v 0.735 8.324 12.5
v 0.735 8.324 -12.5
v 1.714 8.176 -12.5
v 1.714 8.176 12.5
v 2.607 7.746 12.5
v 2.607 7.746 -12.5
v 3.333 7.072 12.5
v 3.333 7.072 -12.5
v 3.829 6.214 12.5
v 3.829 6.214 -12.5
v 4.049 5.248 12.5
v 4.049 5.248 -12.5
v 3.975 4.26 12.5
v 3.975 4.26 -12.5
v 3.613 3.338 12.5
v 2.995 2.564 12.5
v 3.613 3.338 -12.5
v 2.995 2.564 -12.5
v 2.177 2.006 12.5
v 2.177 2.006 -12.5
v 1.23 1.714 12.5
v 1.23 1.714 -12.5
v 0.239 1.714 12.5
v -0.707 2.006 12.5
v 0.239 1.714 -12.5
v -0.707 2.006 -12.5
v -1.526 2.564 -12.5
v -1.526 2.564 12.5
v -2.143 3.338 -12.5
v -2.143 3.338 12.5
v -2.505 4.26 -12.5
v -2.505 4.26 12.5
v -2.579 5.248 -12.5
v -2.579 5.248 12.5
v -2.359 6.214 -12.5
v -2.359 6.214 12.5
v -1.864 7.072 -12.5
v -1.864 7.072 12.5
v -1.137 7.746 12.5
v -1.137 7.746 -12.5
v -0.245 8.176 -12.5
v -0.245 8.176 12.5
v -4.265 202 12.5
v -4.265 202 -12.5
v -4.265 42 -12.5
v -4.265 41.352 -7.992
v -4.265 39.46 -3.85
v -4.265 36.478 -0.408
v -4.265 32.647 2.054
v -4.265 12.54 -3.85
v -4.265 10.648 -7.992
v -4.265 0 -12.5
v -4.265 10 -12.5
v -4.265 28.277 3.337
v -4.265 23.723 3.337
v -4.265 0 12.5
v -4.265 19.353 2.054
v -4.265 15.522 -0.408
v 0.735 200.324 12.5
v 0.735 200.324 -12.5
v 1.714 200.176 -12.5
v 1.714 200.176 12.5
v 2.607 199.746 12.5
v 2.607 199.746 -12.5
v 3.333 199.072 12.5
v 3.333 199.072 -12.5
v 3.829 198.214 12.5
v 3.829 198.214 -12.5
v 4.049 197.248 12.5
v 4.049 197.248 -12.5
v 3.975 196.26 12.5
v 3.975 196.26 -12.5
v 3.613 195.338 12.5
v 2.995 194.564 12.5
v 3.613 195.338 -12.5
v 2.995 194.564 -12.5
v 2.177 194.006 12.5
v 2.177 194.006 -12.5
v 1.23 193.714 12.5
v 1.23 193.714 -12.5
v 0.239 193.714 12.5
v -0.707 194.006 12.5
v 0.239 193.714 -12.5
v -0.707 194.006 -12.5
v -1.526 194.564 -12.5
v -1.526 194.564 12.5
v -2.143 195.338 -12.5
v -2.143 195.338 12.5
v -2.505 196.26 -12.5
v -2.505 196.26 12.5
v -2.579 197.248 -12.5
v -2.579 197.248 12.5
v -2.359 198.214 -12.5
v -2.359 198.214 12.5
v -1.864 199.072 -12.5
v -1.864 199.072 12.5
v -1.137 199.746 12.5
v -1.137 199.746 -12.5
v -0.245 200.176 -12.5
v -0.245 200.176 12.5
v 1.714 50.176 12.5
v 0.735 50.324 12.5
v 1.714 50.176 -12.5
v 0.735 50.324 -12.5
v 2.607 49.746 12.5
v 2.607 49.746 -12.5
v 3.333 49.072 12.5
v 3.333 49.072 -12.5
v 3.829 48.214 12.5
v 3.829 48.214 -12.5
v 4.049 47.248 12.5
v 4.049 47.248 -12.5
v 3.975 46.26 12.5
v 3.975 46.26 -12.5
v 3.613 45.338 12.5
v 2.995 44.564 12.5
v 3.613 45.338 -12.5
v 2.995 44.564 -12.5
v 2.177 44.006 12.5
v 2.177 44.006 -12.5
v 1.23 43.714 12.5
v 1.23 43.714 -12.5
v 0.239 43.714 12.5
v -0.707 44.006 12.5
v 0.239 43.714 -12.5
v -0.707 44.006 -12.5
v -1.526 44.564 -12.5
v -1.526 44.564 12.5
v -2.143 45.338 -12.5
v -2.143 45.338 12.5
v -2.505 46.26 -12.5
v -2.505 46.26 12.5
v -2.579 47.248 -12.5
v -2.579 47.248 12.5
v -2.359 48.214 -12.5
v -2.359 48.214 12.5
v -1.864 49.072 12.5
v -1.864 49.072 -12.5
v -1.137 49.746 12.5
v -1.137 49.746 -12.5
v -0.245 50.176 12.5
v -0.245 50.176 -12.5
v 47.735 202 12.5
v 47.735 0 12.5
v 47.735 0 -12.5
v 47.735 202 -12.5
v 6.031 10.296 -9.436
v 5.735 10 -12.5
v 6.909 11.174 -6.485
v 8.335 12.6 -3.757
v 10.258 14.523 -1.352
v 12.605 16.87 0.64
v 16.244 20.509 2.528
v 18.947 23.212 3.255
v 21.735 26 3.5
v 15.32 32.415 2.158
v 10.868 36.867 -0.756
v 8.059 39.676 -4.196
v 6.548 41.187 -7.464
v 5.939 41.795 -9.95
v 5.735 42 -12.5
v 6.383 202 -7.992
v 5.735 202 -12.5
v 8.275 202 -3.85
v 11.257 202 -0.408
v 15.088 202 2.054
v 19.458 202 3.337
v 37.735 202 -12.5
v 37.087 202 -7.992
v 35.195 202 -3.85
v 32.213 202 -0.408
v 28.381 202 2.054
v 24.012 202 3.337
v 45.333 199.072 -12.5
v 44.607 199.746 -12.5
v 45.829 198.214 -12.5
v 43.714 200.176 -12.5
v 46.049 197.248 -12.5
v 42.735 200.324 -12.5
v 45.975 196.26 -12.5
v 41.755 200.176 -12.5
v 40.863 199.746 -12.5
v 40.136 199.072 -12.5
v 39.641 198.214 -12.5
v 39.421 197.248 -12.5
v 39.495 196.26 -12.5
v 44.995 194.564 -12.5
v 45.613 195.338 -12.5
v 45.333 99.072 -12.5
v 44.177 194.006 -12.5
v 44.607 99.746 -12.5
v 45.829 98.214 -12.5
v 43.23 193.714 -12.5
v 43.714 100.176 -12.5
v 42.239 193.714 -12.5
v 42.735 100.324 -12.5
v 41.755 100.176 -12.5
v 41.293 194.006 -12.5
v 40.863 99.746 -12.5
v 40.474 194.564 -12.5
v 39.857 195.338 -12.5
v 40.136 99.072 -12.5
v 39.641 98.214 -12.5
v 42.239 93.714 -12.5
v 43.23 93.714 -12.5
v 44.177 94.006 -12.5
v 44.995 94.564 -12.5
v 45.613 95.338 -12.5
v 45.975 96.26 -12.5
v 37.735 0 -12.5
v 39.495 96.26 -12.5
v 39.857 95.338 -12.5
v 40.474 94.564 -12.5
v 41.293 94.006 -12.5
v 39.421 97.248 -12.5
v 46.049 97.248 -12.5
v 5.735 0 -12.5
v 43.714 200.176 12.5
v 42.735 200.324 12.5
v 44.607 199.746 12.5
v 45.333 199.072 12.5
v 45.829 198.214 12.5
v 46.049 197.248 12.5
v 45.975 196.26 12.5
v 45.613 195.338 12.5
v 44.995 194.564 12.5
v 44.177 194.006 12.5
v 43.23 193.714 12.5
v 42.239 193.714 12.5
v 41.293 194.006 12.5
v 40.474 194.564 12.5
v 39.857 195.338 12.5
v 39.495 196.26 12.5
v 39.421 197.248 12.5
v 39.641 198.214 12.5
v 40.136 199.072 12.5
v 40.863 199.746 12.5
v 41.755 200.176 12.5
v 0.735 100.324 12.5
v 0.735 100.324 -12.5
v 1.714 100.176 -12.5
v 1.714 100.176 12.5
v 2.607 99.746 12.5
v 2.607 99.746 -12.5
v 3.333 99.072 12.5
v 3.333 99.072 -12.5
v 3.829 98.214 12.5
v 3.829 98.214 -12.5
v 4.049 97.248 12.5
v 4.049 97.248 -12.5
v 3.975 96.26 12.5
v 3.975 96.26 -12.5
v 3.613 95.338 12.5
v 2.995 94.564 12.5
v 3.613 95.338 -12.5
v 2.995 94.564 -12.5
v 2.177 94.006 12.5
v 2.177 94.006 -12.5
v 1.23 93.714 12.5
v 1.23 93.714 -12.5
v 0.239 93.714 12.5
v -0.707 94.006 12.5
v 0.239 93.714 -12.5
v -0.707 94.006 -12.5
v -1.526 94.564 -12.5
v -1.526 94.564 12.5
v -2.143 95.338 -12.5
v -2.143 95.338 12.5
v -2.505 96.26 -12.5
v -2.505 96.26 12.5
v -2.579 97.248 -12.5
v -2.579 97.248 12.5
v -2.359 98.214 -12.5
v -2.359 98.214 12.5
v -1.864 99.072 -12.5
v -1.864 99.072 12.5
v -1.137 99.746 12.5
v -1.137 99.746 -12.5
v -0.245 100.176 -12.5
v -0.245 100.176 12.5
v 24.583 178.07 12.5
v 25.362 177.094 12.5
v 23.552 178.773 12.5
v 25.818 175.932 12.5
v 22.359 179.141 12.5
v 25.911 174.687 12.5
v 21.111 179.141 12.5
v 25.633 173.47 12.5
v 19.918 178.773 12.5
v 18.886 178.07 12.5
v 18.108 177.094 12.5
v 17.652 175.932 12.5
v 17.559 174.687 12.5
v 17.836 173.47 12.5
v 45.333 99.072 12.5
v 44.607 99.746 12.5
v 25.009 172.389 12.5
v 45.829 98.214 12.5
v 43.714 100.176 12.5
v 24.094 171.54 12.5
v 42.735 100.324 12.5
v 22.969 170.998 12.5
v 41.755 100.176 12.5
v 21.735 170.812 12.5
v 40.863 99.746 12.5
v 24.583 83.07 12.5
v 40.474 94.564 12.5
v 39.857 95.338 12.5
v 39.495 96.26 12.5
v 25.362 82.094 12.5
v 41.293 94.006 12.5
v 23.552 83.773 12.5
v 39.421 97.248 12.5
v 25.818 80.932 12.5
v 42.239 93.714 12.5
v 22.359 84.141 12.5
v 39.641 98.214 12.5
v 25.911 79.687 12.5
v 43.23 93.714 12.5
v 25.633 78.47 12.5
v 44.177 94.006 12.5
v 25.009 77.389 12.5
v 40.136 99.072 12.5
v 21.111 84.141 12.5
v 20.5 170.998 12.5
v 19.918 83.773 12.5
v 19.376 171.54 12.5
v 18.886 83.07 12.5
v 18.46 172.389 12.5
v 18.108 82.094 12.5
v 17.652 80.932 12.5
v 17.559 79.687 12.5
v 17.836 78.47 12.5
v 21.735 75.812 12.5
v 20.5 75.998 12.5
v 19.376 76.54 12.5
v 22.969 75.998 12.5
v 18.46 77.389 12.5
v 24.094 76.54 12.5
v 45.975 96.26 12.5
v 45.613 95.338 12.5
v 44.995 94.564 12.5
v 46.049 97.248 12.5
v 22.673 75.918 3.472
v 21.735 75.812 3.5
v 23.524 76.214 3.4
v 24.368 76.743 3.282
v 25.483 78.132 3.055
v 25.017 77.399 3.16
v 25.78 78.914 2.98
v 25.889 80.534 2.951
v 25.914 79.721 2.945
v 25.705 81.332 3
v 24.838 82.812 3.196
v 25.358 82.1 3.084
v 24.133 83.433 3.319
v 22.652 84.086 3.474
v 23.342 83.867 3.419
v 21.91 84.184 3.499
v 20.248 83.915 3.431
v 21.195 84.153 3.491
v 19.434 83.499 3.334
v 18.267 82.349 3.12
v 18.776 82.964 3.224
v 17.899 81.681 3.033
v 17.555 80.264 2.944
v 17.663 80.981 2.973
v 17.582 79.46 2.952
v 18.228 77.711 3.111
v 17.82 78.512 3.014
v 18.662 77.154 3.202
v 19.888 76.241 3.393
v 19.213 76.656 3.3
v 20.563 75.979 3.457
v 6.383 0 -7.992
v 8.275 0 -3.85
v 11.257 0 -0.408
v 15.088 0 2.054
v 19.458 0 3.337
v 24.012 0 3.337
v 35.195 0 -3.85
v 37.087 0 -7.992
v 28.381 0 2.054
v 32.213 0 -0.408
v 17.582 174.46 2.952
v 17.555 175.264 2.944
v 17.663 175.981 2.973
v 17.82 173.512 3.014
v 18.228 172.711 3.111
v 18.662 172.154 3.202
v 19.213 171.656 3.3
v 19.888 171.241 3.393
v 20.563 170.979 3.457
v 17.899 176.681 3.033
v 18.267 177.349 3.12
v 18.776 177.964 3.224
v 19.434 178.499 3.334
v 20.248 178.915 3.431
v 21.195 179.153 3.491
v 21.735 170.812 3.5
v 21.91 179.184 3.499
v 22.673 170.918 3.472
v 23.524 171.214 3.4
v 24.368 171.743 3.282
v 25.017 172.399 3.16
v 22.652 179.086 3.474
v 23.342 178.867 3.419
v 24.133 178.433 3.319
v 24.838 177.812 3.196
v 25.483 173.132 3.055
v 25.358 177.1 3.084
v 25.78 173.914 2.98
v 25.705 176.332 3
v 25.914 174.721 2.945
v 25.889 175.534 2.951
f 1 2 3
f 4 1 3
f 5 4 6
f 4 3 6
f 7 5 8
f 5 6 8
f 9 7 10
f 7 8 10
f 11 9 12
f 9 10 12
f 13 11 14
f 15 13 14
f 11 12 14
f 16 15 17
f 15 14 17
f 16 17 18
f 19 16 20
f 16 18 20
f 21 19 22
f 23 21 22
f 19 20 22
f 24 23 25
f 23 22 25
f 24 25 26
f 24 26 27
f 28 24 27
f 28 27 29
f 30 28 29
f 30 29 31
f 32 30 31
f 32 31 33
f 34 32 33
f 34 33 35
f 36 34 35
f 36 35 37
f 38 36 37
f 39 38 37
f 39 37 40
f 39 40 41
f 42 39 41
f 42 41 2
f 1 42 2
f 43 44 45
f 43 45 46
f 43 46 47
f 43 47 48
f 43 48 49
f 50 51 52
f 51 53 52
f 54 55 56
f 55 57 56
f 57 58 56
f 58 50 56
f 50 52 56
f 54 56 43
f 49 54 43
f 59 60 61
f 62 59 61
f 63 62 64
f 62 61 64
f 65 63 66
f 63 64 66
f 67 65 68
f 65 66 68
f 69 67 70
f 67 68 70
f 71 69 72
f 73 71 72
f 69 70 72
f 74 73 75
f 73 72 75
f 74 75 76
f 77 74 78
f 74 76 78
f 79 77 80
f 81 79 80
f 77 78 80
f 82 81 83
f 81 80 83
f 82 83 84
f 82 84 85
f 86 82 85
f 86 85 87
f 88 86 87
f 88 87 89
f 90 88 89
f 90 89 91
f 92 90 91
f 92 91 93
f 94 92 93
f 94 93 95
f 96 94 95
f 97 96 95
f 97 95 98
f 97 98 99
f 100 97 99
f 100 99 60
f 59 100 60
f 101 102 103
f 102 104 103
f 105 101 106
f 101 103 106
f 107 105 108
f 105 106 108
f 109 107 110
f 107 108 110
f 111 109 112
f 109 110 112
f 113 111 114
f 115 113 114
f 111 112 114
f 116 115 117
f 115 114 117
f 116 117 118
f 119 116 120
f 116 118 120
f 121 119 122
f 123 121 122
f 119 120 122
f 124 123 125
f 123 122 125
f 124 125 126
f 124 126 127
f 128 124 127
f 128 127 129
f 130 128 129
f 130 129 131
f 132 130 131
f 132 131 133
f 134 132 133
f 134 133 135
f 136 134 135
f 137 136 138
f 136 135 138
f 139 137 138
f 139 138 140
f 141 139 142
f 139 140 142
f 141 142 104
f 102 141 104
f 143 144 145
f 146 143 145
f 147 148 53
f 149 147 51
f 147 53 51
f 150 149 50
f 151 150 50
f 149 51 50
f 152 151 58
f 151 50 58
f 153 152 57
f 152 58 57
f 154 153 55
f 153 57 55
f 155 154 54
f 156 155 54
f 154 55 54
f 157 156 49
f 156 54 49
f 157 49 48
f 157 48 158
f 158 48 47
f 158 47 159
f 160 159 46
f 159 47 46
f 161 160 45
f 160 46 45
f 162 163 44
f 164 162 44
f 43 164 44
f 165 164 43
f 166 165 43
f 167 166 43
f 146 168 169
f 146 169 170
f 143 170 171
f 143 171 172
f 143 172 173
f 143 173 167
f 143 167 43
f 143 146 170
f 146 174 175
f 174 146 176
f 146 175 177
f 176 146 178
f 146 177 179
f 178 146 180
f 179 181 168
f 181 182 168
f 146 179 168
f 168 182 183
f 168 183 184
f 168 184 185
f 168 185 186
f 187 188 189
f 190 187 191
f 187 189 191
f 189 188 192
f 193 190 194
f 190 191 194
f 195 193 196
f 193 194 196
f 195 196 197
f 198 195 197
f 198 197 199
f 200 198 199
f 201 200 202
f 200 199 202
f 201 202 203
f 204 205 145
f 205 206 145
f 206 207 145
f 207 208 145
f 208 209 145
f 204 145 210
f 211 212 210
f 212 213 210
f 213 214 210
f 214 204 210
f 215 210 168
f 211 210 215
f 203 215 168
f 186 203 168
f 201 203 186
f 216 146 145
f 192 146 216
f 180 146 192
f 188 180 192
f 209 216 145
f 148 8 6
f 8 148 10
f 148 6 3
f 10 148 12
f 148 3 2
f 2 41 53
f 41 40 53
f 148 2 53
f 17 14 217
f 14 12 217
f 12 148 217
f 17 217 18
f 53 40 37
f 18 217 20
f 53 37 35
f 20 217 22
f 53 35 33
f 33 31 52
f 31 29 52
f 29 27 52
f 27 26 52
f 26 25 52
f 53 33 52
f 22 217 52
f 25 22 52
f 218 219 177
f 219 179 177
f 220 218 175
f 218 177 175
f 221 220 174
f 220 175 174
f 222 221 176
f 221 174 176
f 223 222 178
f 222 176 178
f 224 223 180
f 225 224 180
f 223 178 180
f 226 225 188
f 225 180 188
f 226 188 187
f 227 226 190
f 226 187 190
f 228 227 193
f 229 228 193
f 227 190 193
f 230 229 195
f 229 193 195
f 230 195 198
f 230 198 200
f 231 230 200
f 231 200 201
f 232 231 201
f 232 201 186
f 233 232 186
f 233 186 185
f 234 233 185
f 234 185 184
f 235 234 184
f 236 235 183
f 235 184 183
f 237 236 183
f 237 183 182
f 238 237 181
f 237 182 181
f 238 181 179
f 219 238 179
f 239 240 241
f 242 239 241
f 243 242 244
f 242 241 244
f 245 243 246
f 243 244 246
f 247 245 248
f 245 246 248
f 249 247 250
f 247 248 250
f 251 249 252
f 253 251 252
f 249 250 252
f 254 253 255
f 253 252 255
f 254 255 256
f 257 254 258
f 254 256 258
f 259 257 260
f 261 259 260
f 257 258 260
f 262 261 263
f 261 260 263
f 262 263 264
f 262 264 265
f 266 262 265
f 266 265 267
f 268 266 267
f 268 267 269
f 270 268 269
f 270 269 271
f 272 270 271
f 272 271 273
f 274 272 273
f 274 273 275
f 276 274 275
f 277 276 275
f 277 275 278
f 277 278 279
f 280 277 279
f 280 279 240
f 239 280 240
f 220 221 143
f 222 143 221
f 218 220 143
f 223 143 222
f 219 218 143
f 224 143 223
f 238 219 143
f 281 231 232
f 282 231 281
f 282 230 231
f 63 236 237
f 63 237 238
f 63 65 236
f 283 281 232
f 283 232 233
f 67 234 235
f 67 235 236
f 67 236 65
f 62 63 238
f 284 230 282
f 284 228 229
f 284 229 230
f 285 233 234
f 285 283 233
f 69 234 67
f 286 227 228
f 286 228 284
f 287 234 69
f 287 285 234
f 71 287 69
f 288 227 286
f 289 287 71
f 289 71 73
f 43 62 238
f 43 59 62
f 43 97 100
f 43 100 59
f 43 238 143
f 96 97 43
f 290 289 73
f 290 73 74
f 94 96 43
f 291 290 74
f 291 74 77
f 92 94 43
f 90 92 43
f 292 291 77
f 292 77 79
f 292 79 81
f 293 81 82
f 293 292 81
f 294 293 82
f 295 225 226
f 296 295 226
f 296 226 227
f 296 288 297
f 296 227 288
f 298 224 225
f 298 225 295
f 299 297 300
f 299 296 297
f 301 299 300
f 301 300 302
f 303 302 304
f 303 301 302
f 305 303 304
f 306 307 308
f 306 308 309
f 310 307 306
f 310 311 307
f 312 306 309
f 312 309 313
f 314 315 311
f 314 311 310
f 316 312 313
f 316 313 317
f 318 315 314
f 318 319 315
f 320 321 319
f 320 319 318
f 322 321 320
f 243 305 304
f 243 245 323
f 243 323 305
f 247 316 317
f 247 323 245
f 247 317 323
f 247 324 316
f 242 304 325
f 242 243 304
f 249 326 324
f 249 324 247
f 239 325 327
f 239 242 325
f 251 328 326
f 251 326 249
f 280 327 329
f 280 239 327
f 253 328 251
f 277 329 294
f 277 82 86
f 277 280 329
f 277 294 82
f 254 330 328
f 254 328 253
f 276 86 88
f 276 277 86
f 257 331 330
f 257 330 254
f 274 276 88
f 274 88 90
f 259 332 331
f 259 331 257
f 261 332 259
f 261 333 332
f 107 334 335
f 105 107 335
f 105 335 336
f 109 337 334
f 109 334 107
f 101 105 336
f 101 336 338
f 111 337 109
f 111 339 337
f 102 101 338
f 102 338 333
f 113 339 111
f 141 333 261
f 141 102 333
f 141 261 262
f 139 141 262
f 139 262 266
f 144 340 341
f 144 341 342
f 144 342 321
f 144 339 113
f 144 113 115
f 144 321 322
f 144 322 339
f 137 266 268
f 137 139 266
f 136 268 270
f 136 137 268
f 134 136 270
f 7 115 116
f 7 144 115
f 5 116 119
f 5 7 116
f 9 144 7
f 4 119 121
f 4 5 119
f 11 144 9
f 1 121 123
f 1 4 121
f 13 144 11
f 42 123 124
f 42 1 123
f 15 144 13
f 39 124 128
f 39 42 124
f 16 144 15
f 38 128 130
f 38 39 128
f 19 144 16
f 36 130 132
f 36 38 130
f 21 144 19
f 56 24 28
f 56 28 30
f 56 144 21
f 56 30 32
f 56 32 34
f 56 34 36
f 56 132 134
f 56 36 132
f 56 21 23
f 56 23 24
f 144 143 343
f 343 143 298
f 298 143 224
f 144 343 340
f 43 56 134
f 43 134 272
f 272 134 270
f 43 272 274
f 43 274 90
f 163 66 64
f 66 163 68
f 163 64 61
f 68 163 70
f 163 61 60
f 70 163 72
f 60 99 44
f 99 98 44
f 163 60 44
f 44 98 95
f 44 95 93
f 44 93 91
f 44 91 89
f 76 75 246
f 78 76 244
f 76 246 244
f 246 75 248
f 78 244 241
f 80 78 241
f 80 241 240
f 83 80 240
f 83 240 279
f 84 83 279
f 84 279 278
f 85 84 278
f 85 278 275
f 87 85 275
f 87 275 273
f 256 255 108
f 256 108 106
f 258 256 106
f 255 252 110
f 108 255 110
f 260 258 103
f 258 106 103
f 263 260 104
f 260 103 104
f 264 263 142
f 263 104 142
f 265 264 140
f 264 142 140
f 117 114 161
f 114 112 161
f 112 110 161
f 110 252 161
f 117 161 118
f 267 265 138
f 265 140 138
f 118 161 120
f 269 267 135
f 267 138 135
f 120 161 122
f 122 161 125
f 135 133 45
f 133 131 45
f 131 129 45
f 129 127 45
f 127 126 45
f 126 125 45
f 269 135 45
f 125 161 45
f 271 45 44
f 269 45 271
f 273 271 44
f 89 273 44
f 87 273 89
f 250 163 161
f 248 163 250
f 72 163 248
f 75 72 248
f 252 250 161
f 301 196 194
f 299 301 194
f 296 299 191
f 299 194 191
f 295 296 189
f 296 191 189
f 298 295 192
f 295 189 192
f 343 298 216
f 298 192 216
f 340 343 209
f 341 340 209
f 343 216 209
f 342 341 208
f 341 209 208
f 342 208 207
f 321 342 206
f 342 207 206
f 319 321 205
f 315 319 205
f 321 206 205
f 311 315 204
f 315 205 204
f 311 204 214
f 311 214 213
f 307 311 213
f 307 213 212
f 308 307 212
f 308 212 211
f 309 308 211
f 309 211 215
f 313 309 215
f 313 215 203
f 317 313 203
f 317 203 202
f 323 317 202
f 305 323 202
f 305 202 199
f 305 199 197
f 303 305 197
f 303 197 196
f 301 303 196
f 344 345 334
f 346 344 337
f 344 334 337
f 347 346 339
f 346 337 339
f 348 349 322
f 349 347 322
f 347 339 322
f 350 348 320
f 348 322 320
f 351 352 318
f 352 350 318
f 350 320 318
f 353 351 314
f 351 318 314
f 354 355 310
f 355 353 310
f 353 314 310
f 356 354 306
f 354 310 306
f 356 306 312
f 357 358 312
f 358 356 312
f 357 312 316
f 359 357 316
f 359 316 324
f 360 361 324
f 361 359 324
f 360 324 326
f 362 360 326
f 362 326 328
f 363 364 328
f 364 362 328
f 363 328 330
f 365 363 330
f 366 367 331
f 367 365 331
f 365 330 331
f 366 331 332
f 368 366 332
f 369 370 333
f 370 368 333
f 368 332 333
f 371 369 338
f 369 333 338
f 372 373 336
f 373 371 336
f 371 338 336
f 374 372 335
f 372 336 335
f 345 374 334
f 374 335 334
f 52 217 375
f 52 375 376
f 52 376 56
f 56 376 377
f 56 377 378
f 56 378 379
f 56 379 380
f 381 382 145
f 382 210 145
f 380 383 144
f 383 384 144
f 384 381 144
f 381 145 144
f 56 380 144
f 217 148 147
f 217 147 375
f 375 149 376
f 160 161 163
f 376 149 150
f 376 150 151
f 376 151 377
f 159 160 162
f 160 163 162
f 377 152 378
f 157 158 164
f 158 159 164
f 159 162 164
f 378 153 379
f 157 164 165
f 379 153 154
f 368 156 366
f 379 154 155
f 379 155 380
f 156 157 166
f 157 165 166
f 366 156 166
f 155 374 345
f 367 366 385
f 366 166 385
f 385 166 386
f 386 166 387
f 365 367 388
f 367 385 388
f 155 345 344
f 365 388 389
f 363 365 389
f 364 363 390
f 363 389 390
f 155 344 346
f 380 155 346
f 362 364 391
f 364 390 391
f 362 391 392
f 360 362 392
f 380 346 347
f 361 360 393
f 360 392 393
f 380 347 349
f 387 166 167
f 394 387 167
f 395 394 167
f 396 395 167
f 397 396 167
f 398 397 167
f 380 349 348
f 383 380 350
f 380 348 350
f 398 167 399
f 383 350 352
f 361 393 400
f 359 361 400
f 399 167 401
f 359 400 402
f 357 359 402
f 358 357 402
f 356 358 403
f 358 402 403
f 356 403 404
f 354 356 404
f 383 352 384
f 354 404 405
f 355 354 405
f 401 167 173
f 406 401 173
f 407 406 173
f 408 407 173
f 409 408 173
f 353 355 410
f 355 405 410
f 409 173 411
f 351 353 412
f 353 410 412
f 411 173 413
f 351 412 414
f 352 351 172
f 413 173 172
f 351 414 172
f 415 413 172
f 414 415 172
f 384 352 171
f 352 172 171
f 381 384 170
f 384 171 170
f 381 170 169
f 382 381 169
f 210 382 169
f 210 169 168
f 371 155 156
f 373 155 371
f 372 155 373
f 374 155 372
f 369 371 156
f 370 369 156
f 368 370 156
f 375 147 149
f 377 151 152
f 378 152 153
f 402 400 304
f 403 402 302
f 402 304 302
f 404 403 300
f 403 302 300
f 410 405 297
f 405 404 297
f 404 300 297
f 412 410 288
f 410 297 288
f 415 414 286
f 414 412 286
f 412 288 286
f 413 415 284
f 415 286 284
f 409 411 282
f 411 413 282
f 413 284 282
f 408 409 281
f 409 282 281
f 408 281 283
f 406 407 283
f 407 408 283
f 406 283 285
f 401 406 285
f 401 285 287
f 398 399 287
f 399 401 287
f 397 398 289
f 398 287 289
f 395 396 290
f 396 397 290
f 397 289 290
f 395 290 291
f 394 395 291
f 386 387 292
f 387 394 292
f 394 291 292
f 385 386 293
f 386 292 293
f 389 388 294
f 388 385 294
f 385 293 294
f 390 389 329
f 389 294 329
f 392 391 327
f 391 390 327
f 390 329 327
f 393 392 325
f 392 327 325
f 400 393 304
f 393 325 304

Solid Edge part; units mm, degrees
sketch "Sketch1" plane through (0, 0, 0) normal (0, 1, 0) x (-1, 0, 0)
  line L0 (-47.7348, -12.5) -> (4.2652, -12.5)
  line L1 (4.2652, -12.5) -> (4.2652, 12.5)
  line L2 (-47.7348, 12.5) -> (4.2652, 12.5)
  line L3 (-47.7348, 12.5) -> (-47.7348, -12.5)
  dimension "D1" = 25
  dimension "D2" = 52
extrude "Protrusion1" add sketch "Sketch1" along normal blind 202
sketch "Sketch2" plane through (0, 202, 0) normal (0, 1, 0) x (-1, 0, 0)
  line L0 (-37.7348, -12.5) -> (-5.7348, -12.5)
  arc A0 (-37.7348, -12.5) -> (-5.7348, -12.5) centre (-21.7348, -12.5) cw
  dimension "D1" = 32
extrude "Cutout1" cut sketch "Sketch2" against normal up to next
hole "Hole_7" at (0.7348, 197, -12.5) direction (0, 0, 1) diameter 6.647 end up to next
hole "Hole1" at (42.7348, 197, -12.5) direction (0, 0, 1) diameter 6.647 end up to next
hole "Hole2" at (42.7348, 97, -12.5) direction (0, 0, 1) diameter 6.647 end up to next
hole "Hole3" at (0.7348, 97, -12.5) direction (0, 0, 1) diameter 6.647 end up to next
sketch "Sketch3" plane through (-4.2652, -75, 0) normal (-1, 0, 0) x (0, -1, 0)
  line L0 (-85, -12.5) -> (-117, -12.5)
  arc A0 (-117, -12.5) -> (-85, -12.5) centre (-101, -12.5) cw
  dimension "D1" = 32
  dimension "D2" = 16
  dimension "D3" = 26
extrude "Cutout2" cut sketch "Sketch3" against normal up to next
hole "Hole_11" at (0.7348, 47, -12.5) direction (0, 0, 1) diameter 6.647 end up to next
hole "Hole4" at (0.7348, 5, -12.5) direction (0, 0, 1) diameter 6.647 end up to next
hole "Hole_13" at (21.7348, 80, 12.5) direction (0, 0, -1) diameter 8.376 end up to next
hole "Hole5" at (21.7348, 175, 12.5) direction (0, 0, -1) diameter 8.376 end up to next
properties material "Stainless steel"
